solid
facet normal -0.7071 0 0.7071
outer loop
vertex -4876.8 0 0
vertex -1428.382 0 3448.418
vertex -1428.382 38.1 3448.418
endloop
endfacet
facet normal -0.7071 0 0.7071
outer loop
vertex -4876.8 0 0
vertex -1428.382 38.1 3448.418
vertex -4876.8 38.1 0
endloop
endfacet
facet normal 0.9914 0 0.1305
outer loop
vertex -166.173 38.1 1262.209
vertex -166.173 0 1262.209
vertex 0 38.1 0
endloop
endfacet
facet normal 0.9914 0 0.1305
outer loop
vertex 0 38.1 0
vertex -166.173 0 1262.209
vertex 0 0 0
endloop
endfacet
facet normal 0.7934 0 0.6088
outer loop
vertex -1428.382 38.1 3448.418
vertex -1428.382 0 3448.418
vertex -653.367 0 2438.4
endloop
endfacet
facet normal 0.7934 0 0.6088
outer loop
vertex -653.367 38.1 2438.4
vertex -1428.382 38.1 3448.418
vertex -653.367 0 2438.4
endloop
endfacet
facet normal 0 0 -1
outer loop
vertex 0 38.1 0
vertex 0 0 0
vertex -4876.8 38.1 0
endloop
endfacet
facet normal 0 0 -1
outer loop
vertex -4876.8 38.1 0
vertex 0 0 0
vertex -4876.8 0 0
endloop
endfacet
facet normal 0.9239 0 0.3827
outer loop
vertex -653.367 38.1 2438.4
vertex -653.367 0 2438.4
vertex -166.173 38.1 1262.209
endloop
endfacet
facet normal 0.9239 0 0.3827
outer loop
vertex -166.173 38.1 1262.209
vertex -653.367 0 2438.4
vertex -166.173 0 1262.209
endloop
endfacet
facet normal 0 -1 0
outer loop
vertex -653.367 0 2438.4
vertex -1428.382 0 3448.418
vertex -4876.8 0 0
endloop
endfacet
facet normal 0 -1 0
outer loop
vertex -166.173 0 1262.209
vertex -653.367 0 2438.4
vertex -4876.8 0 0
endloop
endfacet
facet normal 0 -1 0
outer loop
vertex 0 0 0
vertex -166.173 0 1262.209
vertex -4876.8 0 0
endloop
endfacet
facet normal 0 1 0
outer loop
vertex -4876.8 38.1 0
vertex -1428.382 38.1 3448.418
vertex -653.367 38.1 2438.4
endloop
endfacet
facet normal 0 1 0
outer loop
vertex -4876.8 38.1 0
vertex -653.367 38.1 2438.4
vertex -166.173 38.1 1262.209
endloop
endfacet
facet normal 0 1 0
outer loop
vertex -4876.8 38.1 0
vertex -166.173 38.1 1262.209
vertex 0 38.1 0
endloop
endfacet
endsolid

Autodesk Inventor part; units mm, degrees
ref_plane "YZ Plane" through (0, 0, 0) normal (1, 0, 0) x (0, 1, 0)
ref_plane "XZ Plane" through (0, 0, 0) normal (0, 1, 0) x (-1, 0, 0)
ref_plane "XY Plane" through (0, 0, 0) normal (0, 0, 1) x (1, 0, 0)
sketch "Sketch1" plane through (0, 0, 0) normal (0, 1, 0) x (-1, 0, 0)
  line L0 (0, 0) -> (4876.8, 0)
  line L1 (4876.8, 0) -> (166.1729, 1262.2087) construction
  line L2 (4876.8, 0) -> (653.3673, 2438.4) construction
  line L3 (4876.8, 0) -> (1428.3816, 3448.4184) construction
  line L4 (4876.8, 0) -> (3221.736, 2866.6549) construction
  line L5 (4876.8, 0) -> (4071.3531, 3005.9689) construction
  line L6 (4876.8, 0) -> (7988.808, 0) construction
  line L7 (1428.3816, 3448.4184) -> (653.3673, 2438.4)
  line L8 (653.3673, 2438.4) -> (166.1729, 1262.2087)
  line L9 (166.1729, 1262.2087) -> (0, 0)
  line L10 (1428.3816, 3448.4184) -> (4876.8, 0)
  dimension "d0" = 4876.8
  dimension "d8" = 4876.8
  dimension "d9" = 15
  dimension "d10" = 4876.8
  dimension "d11" = 30
  dimension "d12" = 4876.8
  dimension "d13" = 45
  dimension "d14" = 3310.128
  dimension "d15" = 60
  dimension "d18" = 3112.008
  dimension "d19" = 105
extrude "Extrusion1" add sketch "Sketch1" along normal blind 38.1
properties part number "wrapAround" material "Wood (Cherry)"
